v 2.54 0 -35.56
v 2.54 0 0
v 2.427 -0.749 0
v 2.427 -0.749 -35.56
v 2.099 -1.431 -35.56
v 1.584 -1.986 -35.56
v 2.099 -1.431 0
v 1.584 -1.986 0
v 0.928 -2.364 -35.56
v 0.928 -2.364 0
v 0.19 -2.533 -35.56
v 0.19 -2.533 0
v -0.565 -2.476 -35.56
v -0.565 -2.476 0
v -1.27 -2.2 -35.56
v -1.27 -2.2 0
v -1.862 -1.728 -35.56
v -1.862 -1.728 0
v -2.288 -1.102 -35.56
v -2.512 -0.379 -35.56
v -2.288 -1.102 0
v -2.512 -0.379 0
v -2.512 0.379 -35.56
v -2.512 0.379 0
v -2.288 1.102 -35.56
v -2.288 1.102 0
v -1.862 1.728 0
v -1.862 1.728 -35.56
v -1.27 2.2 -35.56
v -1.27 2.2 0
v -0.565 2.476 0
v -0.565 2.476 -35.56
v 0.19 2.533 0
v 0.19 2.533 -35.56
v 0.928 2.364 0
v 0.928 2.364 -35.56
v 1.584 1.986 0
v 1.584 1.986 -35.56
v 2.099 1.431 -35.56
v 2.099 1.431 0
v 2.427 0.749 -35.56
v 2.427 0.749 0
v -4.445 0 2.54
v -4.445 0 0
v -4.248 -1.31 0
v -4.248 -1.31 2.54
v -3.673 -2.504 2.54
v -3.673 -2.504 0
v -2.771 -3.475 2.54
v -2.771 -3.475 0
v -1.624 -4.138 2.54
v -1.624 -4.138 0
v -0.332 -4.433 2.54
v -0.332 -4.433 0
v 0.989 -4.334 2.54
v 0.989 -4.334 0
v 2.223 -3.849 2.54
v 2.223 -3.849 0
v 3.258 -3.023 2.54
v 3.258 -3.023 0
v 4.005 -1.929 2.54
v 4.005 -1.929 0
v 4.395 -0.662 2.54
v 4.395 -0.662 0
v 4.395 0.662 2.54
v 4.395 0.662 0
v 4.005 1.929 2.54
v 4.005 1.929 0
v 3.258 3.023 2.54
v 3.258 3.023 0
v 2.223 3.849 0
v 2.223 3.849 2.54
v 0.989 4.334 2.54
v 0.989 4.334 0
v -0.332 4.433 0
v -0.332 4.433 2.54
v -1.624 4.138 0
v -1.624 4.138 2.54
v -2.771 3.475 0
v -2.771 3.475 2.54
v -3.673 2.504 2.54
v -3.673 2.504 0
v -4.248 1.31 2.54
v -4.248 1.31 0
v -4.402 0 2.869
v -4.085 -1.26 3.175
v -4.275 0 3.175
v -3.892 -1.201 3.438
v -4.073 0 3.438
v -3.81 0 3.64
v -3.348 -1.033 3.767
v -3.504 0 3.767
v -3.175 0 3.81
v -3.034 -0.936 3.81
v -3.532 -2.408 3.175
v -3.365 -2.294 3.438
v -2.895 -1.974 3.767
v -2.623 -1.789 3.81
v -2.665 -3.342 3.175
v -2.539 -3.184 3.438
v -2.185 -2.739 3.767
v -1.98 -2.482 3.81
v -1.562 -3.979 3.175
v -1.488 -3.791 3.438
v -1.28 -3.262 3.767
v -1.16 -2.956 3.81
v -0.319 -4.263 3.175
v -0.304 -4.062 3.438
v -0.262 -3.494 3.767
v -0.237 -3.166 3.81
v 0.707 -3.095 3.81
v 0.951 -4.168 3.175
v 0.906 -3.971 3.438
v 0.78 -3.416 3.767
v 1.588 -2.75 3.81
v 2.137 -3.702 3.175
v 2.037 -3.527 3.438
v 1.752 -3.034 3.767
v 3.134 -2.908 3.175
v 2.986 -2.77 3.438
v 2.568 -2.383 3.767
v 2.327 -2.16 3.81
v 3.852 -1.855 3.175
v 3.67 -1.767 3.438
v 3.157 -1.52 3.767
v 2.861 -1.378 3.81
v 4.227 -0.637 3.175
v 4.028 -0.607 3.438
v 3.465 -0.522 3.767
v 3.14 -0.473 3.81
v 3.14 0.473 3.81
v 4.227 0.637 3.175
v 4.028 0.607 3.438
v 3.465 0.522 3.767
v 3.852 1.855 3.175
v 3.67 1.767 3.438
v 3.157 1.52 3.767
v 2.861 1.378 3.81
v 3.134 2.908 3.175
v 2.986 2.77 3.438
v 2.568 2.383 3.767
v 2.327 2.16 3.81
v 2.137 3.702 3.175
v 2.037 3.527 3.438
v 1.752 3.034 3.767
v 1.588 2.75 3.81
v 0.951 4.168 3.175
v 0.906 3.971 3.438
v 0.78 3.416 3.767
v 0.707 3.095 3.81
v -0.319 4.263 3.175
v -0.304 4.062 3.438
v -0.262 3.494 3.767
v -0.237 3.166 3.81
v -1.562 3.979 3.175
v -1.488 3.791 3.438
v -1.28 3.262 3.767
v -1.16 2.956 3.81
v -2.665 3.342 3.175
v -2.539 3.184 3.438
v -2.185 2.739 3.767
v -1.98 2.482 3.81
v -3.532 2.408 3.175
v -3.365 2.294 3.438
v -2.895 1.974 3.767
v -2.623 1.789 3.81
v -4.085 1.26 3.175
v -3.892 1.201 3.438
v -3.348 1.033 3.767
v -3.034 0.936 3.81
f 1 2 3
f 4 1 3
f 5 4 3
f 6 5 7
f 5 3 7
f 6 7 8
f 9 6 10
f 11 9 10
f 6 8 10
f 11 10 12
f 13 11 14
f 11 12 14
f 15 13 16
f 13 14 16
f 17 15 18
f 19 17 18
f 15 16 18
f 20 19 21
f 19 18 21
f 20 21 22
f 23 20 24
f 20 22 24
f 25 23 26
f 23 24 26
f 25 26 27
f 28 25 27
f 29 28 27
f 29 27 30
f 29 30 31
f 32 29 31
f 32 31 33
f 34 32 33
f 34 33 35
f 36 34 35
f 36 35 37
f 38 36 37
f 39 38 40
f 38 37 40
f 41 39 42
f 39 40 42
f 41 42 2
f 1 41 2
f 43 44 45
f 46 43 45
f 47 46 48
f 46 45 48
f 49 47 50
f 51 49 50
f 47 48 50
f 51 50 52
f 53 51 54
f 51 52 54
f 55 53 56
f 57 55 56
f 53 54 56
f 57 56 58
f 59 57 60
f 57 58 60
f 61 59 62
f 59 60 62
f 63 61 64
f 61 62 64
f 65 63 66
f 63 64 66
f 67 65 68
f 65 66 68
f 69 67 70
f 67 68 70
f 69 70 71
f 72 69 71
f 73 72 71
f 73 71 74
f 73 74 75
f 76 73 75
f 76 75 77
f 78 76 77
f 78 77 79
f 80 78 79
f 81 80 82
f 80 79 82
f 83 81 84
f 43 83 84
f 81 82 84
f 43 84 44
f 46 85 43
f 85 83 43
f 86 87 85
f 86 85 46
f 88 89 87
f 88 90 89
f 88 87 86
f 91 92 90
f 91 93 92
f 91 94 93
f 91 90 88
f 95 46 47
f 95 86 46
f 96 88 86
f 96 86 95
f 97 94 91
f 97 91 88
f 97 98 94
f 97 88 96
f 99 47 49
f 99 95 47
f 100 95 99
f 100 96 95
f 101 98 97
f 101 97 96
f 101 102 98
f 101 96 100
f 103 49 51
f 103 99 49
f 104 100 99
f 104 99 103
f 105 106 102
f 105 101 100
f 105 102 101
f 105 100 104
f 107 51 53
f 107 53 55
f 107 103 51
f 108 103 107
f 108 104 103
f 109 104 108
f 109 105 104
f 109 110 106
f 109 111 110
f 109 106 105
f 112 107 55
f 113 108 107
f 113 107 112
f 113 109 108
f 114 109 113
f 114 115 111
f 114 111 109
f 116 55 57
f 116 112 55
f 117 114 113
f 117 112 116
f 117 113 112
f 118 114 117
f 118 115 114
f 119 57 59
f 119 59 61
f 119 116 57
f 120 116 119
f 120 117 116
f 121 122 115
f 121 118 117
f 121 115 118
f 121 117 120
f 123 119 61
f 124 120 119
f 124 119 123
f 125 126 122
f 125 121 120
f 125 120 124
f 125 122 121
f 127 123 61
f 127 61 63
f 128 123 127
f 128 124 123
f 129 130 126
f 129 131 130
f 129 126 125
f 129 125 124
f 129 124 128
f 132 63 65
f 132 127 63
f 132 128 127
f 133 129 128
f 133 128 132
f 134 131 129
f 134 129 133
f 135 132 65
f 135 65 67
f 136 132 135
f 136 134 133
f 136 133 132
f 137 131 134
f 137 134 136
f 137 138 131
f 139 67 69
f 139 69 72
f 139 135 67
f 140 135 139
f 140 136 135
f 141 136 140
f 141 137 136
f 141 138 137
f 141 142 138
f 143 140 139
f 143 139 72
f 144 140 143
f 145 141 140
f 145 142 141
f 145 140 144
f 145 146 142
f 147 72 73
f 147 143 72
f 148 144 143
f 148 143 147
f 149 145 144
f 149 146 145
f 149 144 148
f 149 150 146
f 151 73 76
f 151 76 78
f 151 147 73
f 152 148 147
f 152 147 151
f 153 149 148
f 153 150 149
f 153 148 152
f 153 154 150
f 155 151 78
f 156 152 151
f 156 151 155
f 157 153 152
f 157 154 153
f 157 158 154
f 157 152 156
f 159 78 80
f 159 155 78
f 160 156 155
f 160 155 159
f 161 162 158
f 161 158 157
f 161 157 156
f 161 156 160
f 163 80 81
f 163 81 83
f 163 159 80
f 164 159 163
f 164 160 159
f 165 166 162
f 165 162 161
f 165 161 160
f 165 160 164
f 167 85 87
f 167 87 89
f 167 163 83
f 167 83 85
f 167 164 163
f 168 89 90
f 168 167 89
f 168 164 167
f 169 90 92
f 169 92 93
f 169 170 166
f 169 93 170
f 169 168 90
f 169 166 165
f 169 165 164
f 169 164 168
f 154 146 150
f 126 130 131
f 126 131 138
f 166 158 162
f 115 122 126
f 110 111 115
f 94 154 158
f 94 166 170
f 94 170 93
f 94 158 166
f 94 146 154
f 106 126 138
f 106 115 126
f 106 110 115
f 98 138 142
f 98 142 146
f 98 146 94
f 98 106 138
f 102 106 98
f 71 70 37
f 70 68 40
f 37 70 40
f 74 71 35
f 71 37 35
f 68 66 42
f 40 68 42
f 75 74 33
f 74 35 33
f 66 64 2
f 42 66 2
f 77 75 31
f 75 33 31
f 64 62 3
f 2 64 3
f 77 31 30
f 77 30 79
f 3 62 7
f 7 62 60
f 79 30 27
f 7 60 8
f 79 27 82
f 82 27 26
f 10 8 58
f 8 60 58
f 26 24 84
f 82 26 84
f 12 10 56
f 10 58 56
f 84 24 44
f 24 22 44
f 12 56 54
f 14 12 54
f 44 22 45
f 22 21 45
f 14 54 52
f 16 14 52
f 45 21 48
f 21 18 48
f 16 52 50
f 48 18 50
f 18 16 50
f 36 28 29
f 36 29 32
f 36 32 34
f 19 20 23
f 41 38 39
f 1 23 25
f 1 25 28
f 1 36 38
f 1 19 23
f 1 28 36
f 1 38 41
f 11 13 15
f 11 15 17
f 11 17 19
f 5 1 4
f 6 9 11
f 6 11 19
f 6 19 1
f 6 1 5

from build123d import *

# Parameters (mm, degrees)
SKETCH1_R           = 4.445
BOSS_EXTRUDE1_DEPTH = 3.81
FILLET2_R           = 1.27
SKETCH2_R           = 2.54
BOSS_EXTRUDE2_DEPTH = 35.56


with BuildPart() as part:
    # Sketch1 → Boss-Extrude1 (new body)
    with BuildSketch(Plane.XY):
        with Locations(Location((0, 0, 0), (0, 0, 180))):
            Circle(SKETCH1_R)
    extrude(amount=BOSS_EXTRUDE1_DEPTH)

    # Fillet2
    fillet2_edges = [part.edges().sort_by_distance(p)[0] for p in [
        (4.445, 0, 3.81),
    ]]
    fillet(fillet2_edges, radius=FILLET2_R)

    # Sketch2 → Boss-Extrude2 (add)
    with BuildSketch(Plane(origin=(0, 0, 0), x_dir=(-1, 0, 0), z_dir=(0, 0, -1))):
        with Locations(Location((0, 0, 0), (0, 0, 180))):
            Circle(SKETCH2_R)
    extrude(amount=BOSS_EXTRUDE2_DEPTH)


solid = part.part
